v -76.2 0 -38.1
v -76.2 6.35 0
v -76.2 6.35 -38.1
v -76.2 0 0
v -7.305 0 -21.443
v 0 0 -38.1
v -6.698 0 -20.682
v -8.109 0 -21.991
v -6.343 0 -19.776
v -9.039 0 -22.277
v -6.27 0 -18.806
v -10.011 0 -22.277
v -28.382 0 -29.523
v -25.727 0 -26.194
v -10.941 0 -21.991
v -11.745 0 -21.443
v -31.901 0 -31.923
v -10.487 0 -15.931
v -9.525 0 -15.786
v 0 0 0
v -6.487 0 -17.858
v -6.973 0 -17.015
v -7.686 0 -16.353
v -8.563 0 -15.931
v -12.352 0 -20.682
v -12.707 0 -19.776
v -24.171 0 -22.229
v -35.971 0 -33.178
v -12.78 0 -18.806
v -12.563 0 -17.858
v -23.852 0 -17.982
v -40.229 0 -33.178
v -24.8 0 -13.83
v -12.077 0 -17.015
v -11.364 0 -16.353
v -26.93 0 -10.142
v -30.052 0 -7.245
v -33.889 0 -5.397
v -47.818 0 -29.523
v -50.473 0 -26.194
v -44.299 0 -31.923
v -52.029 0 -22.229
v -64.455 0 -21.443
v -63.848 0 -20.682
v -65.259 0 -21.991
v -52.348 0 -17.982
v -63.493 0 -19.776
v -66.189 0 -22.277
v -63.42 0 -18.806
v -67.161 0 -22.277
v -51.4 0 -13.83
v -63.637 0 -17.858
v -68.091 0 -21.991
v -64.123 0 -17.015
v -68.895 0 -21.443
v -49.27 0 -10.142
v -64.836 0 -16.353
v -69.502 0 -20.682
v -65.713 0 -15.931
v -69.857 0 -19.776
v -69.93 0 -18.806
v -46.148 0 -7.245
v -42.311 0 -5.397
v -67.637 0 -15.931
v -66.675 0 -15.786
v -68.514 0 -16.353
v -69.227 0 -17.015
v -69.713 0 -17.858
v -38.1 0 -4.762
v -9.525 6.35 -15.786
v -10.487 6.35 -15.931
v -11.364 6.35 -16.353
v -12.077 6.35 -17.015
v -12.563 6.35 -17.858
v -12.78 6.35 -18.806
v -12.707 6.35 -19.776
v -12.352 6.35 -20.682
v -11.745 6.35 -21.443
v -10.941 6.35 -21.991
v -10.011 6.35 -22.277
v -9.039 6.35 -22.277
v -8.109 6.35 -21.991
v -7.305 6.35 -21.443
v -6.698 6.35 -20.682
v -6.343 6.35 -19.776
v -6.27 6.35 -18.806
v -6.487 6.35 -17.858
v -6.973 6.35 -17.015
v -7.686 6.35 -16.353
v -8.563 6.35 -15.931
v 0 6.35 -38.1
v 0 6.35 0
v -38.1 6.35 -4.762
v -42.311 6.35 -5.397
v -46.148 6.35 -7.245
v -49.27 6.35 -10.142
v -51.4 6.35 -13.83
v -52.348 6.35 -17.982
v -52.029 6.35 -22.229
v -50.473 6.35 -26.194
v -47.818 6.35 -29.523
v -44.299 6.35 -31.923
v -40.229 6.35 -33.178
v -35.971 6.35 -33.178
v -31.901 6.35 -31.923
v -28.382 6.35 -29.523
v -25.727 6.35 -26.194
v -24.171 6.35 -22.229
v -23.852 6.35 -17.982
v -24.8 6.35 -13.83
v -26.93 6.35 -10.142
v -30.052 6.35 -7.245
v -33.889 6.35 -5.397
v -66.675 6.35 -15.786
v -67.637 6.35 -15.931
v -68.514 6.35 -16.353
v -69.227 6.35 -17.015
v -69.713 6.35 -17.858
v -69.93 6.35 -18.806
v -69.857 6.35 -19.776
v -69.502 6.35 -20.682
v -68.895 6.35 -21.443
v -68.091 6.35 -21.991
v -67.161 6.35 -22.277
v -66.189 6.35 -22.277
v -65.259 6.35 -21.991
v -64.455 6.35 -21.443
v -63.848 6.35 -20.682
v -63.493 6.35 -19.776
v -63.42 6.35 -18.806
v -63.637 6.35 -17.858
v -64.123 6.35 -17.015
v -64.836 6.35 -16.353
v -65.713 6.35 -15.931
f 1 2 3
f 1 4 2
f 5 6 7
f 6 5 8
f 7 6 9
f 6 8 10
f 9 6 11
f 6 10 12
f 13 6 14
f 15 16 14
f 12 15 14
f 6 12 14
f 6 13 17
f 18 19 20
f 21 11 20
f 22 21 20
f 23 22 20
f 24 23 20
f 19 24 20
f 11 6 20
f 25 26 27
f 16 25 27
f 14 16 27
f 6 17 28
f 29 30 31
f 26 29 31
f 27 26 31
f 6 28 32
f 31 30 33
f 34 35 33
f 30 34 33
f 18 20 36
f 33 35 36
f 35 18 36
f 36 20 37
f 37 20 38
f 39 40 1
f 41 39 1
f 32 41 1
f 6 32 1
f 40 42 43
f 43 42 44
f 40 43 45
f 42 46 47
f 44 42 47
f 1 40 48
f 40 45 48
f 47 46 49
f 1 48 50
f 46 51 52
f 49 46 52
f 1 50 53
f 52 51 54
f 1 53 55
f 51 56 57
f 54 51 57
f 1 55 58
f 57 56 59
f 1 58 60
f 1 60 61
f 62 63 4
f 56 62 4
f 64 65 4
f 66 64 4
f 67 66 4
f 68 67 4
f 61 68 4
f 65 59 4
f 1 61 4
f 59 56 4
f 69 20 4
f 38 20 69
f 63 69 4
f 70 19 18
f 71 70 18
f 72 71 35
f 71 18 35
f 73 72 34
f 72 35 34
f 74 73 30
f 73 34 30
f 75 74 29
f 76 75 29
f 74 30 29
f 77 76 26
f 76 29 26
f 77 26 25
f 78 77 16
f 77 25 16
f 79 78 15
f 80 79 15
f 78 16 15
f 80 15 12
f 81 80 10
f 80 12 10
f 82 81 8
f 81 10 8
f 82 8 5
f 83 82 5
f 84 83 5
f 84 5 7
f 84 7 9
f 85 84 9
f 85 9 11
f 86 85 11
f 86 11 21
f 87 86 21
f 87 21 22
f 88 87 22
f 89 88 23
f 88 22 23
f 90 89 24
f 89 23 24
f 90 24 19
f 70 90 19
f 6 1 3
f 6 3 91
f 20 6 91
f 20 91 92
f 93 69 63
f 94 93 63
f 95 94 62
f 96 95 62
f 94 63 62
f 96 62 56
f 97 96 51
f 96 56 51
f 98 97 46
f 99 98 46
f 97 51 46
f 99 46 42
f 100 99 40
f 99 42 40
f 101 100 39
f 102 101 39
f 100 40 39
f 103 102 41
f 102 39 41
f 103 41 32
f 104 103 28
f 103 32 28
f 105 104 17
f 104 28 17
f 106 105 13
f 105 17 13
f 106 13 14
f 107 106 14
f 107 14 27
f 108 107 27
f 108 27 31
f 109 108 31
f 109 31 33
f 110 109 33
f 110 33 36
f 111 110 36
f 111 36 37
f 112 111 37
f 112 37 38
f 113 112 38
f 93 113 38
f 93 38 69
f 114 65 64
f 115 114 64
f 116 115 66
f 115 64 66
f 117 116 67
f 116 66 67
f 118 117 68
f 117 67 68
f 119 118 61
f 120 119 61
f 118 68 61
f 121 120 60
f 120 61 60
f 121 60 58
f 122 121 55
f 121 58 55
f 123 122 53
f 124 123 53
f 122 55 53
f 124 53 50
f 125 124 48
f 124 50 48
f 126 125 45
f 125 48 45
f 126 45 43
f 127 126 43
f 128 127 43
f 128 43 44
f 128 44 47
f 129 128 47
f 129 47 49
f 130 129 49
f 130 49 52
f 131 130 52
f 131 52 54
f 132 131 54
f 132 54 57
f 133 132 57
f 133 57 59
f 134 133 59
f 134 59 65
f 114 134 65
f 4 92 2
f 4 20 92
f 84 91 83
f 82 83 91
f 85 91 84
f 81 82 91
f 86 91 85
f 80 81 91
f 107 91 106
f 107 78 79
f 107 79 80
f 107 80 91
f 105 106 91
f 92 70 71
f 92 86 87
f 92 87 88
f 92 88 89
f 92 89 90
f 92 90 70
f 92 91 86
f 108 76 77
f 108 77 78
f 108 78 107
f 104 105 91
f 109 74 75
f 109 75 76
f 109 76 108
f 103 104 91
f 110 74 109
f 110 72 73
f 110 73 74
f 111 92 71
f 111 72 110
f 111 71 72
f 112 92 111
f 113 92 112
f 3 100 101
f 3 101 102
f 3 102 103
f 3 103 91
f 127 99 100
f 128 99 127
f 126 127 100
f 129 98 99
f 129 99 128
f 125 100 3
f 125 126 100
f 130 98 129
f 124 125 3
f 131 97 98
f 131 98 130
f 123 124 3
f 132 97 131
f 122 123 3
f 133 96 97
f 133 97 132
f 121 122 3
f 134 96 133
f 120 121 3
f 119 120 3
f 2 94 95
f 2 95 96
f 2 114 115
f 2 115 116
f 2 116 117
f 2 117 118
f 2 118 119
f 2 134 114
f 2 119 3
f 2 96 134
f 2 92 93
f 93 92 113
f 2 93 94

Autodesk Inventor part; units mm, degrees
ref_plane "YZ Plane" through (0, 0, 0) normal (1, 0, 0) x (0, 1, 0)
ref_plane "XZ Plane" through (0, 0, 0) normal (0, 1, 0) x (-1, 0, 0)
ref_plane "XY Plane" through (0, 0, 0) normal (0, 0, 1) x (1, 0, 0)
sketch "Sketch1" plane through (0, 0, 0) normal (0, 1, 0) x (-1, 0, 0)
  line L0 (0, 0) -> (76.2, 0)
  line L1 (76.2, 0) -> (76.2, -38.1)
  line L2 (76.2, -38.1) -> (0, -38.1)
  line L3 (0, -38.1) -> (0, 0)
  dimension "d0" = 76.2
  dimension "d1" = 38.1
extrude "Plate1" add sketch "Sketch1" along normal blind 6.35
sketch "Sketch2" plane through (0, 6.35, 0) normal (0, 1, 0) x (1, 0, 0)
  line L0 (-76.2, 38.1) -> (0, 38.1) projected
  line L1 (-76.2, 0) -> (-76.2, 38.1) projected
  point P0 (0, 0)
  point P1 (-38.1, 19.05)
  dimension "d3" = 19.05
  dimension "d4" = 38.1
hole "Hole1" at (-38.1, 6.35, -19.05) direction (0, -1, 0) diameter 28.575 end through all
sketch "Sketch4" plane through (0, 6.35, 0) normal (0, 1, 0) x (1, 0, 0)
  line L0 (-66.675, 19.05) -> (-9.525, 19.05) construction
  circle A0 centre (-38.1, 19.05) radius 14.2875 construction
  point P0 (0, 0)
  dimension "d28" = 28.575
  dimension "d29" = 28.575
hole "Hole3" at (-66.675, 6.35, -19.05) at (-9.525, 6.35, -19.05) direction (0, -1, 0) diameter 6.5278 end through all clearance for "Socket Head Cap Screw" size "1/4" standard "Ansi Unified Screw Threads"
equation "\"d4\" = 0.5 * d0"
equation "\"d10\" = Thickness"
equation "\"d28\" = CenterPointToTensionerRound"
equation "\"d29\" = d28"
equation "\"d31\" = ShapeWidth"
equation "\"d35\" = Thickness"
equation "\"d2\" = Thickness"
equation "\"BendRadius\" = 1.5 * Thickness"
equation "\"BendReliefWidth\" = Thickness"
equation "\"BendReliefDepth\" = 0.5 * Thickness"
equation "\"CornerReliefSize\" = 4 * Thickness"
equation "\"MinimumRemnant\" = 2 * Thickness"
equation "\"TransitionRadius\" = BendRadius"
equation "\"JacobiRadiusSize\" = BendRadius"
equation "\"GapSize\" = Thickness"
equation "\"DrivebaseLength\" = 762"
equation "\"DrivebaseWidth\" = 660.4"
equation "\"CenterlineDrivebaseLength\" = 736.6"
equation "\"CenterlineDrivebaseWidth\" = 635"
equation "\"ShapeHeight\" = 76.2"
equation "\"ShapeWidth\" = 25.4"
equation "\"ShapeThickness\" = 3.175"
equation "\"WheelDiameter\" = 152.4"
equation "\"WheelRadius\" = 76.2"
equation "\"WheelClearancetoFrame\" = 25.4"
equation "\"WheelDistanceFromEdge\" = 101.6"
equation "\"SlotLength\" = 88.9"
equation "\"SlotWidth\" = 15.9512"
equation "\"CenterAxleDrop\" = 3.175"
equation "\"SlidingTensionerRoundDiameter\" = 15.875"
equation "\"SlidingTensionerRoundClearance\" = 0.0762"
equation "\"CenterAxleXPosition\" = 381"
equation "\"CenterAxleYPosition\" = 25.4"
equation "\"Crossmember1Position\" = 203.2"
equation "\"Crossmember2Position\" = 203.2"
equation "\"TensionAssemblyJointTravelLengthStart\" = -15.875"
equation "\"TensionAssemblyJointTravelLengthEnd\" = 15.875"
equation "\"CenterPointToTensionerRound\" = 28.575"
equation "\"Thickness\" = 6.35"
properties part number "200288" material "Aluminum 5052 H32"
